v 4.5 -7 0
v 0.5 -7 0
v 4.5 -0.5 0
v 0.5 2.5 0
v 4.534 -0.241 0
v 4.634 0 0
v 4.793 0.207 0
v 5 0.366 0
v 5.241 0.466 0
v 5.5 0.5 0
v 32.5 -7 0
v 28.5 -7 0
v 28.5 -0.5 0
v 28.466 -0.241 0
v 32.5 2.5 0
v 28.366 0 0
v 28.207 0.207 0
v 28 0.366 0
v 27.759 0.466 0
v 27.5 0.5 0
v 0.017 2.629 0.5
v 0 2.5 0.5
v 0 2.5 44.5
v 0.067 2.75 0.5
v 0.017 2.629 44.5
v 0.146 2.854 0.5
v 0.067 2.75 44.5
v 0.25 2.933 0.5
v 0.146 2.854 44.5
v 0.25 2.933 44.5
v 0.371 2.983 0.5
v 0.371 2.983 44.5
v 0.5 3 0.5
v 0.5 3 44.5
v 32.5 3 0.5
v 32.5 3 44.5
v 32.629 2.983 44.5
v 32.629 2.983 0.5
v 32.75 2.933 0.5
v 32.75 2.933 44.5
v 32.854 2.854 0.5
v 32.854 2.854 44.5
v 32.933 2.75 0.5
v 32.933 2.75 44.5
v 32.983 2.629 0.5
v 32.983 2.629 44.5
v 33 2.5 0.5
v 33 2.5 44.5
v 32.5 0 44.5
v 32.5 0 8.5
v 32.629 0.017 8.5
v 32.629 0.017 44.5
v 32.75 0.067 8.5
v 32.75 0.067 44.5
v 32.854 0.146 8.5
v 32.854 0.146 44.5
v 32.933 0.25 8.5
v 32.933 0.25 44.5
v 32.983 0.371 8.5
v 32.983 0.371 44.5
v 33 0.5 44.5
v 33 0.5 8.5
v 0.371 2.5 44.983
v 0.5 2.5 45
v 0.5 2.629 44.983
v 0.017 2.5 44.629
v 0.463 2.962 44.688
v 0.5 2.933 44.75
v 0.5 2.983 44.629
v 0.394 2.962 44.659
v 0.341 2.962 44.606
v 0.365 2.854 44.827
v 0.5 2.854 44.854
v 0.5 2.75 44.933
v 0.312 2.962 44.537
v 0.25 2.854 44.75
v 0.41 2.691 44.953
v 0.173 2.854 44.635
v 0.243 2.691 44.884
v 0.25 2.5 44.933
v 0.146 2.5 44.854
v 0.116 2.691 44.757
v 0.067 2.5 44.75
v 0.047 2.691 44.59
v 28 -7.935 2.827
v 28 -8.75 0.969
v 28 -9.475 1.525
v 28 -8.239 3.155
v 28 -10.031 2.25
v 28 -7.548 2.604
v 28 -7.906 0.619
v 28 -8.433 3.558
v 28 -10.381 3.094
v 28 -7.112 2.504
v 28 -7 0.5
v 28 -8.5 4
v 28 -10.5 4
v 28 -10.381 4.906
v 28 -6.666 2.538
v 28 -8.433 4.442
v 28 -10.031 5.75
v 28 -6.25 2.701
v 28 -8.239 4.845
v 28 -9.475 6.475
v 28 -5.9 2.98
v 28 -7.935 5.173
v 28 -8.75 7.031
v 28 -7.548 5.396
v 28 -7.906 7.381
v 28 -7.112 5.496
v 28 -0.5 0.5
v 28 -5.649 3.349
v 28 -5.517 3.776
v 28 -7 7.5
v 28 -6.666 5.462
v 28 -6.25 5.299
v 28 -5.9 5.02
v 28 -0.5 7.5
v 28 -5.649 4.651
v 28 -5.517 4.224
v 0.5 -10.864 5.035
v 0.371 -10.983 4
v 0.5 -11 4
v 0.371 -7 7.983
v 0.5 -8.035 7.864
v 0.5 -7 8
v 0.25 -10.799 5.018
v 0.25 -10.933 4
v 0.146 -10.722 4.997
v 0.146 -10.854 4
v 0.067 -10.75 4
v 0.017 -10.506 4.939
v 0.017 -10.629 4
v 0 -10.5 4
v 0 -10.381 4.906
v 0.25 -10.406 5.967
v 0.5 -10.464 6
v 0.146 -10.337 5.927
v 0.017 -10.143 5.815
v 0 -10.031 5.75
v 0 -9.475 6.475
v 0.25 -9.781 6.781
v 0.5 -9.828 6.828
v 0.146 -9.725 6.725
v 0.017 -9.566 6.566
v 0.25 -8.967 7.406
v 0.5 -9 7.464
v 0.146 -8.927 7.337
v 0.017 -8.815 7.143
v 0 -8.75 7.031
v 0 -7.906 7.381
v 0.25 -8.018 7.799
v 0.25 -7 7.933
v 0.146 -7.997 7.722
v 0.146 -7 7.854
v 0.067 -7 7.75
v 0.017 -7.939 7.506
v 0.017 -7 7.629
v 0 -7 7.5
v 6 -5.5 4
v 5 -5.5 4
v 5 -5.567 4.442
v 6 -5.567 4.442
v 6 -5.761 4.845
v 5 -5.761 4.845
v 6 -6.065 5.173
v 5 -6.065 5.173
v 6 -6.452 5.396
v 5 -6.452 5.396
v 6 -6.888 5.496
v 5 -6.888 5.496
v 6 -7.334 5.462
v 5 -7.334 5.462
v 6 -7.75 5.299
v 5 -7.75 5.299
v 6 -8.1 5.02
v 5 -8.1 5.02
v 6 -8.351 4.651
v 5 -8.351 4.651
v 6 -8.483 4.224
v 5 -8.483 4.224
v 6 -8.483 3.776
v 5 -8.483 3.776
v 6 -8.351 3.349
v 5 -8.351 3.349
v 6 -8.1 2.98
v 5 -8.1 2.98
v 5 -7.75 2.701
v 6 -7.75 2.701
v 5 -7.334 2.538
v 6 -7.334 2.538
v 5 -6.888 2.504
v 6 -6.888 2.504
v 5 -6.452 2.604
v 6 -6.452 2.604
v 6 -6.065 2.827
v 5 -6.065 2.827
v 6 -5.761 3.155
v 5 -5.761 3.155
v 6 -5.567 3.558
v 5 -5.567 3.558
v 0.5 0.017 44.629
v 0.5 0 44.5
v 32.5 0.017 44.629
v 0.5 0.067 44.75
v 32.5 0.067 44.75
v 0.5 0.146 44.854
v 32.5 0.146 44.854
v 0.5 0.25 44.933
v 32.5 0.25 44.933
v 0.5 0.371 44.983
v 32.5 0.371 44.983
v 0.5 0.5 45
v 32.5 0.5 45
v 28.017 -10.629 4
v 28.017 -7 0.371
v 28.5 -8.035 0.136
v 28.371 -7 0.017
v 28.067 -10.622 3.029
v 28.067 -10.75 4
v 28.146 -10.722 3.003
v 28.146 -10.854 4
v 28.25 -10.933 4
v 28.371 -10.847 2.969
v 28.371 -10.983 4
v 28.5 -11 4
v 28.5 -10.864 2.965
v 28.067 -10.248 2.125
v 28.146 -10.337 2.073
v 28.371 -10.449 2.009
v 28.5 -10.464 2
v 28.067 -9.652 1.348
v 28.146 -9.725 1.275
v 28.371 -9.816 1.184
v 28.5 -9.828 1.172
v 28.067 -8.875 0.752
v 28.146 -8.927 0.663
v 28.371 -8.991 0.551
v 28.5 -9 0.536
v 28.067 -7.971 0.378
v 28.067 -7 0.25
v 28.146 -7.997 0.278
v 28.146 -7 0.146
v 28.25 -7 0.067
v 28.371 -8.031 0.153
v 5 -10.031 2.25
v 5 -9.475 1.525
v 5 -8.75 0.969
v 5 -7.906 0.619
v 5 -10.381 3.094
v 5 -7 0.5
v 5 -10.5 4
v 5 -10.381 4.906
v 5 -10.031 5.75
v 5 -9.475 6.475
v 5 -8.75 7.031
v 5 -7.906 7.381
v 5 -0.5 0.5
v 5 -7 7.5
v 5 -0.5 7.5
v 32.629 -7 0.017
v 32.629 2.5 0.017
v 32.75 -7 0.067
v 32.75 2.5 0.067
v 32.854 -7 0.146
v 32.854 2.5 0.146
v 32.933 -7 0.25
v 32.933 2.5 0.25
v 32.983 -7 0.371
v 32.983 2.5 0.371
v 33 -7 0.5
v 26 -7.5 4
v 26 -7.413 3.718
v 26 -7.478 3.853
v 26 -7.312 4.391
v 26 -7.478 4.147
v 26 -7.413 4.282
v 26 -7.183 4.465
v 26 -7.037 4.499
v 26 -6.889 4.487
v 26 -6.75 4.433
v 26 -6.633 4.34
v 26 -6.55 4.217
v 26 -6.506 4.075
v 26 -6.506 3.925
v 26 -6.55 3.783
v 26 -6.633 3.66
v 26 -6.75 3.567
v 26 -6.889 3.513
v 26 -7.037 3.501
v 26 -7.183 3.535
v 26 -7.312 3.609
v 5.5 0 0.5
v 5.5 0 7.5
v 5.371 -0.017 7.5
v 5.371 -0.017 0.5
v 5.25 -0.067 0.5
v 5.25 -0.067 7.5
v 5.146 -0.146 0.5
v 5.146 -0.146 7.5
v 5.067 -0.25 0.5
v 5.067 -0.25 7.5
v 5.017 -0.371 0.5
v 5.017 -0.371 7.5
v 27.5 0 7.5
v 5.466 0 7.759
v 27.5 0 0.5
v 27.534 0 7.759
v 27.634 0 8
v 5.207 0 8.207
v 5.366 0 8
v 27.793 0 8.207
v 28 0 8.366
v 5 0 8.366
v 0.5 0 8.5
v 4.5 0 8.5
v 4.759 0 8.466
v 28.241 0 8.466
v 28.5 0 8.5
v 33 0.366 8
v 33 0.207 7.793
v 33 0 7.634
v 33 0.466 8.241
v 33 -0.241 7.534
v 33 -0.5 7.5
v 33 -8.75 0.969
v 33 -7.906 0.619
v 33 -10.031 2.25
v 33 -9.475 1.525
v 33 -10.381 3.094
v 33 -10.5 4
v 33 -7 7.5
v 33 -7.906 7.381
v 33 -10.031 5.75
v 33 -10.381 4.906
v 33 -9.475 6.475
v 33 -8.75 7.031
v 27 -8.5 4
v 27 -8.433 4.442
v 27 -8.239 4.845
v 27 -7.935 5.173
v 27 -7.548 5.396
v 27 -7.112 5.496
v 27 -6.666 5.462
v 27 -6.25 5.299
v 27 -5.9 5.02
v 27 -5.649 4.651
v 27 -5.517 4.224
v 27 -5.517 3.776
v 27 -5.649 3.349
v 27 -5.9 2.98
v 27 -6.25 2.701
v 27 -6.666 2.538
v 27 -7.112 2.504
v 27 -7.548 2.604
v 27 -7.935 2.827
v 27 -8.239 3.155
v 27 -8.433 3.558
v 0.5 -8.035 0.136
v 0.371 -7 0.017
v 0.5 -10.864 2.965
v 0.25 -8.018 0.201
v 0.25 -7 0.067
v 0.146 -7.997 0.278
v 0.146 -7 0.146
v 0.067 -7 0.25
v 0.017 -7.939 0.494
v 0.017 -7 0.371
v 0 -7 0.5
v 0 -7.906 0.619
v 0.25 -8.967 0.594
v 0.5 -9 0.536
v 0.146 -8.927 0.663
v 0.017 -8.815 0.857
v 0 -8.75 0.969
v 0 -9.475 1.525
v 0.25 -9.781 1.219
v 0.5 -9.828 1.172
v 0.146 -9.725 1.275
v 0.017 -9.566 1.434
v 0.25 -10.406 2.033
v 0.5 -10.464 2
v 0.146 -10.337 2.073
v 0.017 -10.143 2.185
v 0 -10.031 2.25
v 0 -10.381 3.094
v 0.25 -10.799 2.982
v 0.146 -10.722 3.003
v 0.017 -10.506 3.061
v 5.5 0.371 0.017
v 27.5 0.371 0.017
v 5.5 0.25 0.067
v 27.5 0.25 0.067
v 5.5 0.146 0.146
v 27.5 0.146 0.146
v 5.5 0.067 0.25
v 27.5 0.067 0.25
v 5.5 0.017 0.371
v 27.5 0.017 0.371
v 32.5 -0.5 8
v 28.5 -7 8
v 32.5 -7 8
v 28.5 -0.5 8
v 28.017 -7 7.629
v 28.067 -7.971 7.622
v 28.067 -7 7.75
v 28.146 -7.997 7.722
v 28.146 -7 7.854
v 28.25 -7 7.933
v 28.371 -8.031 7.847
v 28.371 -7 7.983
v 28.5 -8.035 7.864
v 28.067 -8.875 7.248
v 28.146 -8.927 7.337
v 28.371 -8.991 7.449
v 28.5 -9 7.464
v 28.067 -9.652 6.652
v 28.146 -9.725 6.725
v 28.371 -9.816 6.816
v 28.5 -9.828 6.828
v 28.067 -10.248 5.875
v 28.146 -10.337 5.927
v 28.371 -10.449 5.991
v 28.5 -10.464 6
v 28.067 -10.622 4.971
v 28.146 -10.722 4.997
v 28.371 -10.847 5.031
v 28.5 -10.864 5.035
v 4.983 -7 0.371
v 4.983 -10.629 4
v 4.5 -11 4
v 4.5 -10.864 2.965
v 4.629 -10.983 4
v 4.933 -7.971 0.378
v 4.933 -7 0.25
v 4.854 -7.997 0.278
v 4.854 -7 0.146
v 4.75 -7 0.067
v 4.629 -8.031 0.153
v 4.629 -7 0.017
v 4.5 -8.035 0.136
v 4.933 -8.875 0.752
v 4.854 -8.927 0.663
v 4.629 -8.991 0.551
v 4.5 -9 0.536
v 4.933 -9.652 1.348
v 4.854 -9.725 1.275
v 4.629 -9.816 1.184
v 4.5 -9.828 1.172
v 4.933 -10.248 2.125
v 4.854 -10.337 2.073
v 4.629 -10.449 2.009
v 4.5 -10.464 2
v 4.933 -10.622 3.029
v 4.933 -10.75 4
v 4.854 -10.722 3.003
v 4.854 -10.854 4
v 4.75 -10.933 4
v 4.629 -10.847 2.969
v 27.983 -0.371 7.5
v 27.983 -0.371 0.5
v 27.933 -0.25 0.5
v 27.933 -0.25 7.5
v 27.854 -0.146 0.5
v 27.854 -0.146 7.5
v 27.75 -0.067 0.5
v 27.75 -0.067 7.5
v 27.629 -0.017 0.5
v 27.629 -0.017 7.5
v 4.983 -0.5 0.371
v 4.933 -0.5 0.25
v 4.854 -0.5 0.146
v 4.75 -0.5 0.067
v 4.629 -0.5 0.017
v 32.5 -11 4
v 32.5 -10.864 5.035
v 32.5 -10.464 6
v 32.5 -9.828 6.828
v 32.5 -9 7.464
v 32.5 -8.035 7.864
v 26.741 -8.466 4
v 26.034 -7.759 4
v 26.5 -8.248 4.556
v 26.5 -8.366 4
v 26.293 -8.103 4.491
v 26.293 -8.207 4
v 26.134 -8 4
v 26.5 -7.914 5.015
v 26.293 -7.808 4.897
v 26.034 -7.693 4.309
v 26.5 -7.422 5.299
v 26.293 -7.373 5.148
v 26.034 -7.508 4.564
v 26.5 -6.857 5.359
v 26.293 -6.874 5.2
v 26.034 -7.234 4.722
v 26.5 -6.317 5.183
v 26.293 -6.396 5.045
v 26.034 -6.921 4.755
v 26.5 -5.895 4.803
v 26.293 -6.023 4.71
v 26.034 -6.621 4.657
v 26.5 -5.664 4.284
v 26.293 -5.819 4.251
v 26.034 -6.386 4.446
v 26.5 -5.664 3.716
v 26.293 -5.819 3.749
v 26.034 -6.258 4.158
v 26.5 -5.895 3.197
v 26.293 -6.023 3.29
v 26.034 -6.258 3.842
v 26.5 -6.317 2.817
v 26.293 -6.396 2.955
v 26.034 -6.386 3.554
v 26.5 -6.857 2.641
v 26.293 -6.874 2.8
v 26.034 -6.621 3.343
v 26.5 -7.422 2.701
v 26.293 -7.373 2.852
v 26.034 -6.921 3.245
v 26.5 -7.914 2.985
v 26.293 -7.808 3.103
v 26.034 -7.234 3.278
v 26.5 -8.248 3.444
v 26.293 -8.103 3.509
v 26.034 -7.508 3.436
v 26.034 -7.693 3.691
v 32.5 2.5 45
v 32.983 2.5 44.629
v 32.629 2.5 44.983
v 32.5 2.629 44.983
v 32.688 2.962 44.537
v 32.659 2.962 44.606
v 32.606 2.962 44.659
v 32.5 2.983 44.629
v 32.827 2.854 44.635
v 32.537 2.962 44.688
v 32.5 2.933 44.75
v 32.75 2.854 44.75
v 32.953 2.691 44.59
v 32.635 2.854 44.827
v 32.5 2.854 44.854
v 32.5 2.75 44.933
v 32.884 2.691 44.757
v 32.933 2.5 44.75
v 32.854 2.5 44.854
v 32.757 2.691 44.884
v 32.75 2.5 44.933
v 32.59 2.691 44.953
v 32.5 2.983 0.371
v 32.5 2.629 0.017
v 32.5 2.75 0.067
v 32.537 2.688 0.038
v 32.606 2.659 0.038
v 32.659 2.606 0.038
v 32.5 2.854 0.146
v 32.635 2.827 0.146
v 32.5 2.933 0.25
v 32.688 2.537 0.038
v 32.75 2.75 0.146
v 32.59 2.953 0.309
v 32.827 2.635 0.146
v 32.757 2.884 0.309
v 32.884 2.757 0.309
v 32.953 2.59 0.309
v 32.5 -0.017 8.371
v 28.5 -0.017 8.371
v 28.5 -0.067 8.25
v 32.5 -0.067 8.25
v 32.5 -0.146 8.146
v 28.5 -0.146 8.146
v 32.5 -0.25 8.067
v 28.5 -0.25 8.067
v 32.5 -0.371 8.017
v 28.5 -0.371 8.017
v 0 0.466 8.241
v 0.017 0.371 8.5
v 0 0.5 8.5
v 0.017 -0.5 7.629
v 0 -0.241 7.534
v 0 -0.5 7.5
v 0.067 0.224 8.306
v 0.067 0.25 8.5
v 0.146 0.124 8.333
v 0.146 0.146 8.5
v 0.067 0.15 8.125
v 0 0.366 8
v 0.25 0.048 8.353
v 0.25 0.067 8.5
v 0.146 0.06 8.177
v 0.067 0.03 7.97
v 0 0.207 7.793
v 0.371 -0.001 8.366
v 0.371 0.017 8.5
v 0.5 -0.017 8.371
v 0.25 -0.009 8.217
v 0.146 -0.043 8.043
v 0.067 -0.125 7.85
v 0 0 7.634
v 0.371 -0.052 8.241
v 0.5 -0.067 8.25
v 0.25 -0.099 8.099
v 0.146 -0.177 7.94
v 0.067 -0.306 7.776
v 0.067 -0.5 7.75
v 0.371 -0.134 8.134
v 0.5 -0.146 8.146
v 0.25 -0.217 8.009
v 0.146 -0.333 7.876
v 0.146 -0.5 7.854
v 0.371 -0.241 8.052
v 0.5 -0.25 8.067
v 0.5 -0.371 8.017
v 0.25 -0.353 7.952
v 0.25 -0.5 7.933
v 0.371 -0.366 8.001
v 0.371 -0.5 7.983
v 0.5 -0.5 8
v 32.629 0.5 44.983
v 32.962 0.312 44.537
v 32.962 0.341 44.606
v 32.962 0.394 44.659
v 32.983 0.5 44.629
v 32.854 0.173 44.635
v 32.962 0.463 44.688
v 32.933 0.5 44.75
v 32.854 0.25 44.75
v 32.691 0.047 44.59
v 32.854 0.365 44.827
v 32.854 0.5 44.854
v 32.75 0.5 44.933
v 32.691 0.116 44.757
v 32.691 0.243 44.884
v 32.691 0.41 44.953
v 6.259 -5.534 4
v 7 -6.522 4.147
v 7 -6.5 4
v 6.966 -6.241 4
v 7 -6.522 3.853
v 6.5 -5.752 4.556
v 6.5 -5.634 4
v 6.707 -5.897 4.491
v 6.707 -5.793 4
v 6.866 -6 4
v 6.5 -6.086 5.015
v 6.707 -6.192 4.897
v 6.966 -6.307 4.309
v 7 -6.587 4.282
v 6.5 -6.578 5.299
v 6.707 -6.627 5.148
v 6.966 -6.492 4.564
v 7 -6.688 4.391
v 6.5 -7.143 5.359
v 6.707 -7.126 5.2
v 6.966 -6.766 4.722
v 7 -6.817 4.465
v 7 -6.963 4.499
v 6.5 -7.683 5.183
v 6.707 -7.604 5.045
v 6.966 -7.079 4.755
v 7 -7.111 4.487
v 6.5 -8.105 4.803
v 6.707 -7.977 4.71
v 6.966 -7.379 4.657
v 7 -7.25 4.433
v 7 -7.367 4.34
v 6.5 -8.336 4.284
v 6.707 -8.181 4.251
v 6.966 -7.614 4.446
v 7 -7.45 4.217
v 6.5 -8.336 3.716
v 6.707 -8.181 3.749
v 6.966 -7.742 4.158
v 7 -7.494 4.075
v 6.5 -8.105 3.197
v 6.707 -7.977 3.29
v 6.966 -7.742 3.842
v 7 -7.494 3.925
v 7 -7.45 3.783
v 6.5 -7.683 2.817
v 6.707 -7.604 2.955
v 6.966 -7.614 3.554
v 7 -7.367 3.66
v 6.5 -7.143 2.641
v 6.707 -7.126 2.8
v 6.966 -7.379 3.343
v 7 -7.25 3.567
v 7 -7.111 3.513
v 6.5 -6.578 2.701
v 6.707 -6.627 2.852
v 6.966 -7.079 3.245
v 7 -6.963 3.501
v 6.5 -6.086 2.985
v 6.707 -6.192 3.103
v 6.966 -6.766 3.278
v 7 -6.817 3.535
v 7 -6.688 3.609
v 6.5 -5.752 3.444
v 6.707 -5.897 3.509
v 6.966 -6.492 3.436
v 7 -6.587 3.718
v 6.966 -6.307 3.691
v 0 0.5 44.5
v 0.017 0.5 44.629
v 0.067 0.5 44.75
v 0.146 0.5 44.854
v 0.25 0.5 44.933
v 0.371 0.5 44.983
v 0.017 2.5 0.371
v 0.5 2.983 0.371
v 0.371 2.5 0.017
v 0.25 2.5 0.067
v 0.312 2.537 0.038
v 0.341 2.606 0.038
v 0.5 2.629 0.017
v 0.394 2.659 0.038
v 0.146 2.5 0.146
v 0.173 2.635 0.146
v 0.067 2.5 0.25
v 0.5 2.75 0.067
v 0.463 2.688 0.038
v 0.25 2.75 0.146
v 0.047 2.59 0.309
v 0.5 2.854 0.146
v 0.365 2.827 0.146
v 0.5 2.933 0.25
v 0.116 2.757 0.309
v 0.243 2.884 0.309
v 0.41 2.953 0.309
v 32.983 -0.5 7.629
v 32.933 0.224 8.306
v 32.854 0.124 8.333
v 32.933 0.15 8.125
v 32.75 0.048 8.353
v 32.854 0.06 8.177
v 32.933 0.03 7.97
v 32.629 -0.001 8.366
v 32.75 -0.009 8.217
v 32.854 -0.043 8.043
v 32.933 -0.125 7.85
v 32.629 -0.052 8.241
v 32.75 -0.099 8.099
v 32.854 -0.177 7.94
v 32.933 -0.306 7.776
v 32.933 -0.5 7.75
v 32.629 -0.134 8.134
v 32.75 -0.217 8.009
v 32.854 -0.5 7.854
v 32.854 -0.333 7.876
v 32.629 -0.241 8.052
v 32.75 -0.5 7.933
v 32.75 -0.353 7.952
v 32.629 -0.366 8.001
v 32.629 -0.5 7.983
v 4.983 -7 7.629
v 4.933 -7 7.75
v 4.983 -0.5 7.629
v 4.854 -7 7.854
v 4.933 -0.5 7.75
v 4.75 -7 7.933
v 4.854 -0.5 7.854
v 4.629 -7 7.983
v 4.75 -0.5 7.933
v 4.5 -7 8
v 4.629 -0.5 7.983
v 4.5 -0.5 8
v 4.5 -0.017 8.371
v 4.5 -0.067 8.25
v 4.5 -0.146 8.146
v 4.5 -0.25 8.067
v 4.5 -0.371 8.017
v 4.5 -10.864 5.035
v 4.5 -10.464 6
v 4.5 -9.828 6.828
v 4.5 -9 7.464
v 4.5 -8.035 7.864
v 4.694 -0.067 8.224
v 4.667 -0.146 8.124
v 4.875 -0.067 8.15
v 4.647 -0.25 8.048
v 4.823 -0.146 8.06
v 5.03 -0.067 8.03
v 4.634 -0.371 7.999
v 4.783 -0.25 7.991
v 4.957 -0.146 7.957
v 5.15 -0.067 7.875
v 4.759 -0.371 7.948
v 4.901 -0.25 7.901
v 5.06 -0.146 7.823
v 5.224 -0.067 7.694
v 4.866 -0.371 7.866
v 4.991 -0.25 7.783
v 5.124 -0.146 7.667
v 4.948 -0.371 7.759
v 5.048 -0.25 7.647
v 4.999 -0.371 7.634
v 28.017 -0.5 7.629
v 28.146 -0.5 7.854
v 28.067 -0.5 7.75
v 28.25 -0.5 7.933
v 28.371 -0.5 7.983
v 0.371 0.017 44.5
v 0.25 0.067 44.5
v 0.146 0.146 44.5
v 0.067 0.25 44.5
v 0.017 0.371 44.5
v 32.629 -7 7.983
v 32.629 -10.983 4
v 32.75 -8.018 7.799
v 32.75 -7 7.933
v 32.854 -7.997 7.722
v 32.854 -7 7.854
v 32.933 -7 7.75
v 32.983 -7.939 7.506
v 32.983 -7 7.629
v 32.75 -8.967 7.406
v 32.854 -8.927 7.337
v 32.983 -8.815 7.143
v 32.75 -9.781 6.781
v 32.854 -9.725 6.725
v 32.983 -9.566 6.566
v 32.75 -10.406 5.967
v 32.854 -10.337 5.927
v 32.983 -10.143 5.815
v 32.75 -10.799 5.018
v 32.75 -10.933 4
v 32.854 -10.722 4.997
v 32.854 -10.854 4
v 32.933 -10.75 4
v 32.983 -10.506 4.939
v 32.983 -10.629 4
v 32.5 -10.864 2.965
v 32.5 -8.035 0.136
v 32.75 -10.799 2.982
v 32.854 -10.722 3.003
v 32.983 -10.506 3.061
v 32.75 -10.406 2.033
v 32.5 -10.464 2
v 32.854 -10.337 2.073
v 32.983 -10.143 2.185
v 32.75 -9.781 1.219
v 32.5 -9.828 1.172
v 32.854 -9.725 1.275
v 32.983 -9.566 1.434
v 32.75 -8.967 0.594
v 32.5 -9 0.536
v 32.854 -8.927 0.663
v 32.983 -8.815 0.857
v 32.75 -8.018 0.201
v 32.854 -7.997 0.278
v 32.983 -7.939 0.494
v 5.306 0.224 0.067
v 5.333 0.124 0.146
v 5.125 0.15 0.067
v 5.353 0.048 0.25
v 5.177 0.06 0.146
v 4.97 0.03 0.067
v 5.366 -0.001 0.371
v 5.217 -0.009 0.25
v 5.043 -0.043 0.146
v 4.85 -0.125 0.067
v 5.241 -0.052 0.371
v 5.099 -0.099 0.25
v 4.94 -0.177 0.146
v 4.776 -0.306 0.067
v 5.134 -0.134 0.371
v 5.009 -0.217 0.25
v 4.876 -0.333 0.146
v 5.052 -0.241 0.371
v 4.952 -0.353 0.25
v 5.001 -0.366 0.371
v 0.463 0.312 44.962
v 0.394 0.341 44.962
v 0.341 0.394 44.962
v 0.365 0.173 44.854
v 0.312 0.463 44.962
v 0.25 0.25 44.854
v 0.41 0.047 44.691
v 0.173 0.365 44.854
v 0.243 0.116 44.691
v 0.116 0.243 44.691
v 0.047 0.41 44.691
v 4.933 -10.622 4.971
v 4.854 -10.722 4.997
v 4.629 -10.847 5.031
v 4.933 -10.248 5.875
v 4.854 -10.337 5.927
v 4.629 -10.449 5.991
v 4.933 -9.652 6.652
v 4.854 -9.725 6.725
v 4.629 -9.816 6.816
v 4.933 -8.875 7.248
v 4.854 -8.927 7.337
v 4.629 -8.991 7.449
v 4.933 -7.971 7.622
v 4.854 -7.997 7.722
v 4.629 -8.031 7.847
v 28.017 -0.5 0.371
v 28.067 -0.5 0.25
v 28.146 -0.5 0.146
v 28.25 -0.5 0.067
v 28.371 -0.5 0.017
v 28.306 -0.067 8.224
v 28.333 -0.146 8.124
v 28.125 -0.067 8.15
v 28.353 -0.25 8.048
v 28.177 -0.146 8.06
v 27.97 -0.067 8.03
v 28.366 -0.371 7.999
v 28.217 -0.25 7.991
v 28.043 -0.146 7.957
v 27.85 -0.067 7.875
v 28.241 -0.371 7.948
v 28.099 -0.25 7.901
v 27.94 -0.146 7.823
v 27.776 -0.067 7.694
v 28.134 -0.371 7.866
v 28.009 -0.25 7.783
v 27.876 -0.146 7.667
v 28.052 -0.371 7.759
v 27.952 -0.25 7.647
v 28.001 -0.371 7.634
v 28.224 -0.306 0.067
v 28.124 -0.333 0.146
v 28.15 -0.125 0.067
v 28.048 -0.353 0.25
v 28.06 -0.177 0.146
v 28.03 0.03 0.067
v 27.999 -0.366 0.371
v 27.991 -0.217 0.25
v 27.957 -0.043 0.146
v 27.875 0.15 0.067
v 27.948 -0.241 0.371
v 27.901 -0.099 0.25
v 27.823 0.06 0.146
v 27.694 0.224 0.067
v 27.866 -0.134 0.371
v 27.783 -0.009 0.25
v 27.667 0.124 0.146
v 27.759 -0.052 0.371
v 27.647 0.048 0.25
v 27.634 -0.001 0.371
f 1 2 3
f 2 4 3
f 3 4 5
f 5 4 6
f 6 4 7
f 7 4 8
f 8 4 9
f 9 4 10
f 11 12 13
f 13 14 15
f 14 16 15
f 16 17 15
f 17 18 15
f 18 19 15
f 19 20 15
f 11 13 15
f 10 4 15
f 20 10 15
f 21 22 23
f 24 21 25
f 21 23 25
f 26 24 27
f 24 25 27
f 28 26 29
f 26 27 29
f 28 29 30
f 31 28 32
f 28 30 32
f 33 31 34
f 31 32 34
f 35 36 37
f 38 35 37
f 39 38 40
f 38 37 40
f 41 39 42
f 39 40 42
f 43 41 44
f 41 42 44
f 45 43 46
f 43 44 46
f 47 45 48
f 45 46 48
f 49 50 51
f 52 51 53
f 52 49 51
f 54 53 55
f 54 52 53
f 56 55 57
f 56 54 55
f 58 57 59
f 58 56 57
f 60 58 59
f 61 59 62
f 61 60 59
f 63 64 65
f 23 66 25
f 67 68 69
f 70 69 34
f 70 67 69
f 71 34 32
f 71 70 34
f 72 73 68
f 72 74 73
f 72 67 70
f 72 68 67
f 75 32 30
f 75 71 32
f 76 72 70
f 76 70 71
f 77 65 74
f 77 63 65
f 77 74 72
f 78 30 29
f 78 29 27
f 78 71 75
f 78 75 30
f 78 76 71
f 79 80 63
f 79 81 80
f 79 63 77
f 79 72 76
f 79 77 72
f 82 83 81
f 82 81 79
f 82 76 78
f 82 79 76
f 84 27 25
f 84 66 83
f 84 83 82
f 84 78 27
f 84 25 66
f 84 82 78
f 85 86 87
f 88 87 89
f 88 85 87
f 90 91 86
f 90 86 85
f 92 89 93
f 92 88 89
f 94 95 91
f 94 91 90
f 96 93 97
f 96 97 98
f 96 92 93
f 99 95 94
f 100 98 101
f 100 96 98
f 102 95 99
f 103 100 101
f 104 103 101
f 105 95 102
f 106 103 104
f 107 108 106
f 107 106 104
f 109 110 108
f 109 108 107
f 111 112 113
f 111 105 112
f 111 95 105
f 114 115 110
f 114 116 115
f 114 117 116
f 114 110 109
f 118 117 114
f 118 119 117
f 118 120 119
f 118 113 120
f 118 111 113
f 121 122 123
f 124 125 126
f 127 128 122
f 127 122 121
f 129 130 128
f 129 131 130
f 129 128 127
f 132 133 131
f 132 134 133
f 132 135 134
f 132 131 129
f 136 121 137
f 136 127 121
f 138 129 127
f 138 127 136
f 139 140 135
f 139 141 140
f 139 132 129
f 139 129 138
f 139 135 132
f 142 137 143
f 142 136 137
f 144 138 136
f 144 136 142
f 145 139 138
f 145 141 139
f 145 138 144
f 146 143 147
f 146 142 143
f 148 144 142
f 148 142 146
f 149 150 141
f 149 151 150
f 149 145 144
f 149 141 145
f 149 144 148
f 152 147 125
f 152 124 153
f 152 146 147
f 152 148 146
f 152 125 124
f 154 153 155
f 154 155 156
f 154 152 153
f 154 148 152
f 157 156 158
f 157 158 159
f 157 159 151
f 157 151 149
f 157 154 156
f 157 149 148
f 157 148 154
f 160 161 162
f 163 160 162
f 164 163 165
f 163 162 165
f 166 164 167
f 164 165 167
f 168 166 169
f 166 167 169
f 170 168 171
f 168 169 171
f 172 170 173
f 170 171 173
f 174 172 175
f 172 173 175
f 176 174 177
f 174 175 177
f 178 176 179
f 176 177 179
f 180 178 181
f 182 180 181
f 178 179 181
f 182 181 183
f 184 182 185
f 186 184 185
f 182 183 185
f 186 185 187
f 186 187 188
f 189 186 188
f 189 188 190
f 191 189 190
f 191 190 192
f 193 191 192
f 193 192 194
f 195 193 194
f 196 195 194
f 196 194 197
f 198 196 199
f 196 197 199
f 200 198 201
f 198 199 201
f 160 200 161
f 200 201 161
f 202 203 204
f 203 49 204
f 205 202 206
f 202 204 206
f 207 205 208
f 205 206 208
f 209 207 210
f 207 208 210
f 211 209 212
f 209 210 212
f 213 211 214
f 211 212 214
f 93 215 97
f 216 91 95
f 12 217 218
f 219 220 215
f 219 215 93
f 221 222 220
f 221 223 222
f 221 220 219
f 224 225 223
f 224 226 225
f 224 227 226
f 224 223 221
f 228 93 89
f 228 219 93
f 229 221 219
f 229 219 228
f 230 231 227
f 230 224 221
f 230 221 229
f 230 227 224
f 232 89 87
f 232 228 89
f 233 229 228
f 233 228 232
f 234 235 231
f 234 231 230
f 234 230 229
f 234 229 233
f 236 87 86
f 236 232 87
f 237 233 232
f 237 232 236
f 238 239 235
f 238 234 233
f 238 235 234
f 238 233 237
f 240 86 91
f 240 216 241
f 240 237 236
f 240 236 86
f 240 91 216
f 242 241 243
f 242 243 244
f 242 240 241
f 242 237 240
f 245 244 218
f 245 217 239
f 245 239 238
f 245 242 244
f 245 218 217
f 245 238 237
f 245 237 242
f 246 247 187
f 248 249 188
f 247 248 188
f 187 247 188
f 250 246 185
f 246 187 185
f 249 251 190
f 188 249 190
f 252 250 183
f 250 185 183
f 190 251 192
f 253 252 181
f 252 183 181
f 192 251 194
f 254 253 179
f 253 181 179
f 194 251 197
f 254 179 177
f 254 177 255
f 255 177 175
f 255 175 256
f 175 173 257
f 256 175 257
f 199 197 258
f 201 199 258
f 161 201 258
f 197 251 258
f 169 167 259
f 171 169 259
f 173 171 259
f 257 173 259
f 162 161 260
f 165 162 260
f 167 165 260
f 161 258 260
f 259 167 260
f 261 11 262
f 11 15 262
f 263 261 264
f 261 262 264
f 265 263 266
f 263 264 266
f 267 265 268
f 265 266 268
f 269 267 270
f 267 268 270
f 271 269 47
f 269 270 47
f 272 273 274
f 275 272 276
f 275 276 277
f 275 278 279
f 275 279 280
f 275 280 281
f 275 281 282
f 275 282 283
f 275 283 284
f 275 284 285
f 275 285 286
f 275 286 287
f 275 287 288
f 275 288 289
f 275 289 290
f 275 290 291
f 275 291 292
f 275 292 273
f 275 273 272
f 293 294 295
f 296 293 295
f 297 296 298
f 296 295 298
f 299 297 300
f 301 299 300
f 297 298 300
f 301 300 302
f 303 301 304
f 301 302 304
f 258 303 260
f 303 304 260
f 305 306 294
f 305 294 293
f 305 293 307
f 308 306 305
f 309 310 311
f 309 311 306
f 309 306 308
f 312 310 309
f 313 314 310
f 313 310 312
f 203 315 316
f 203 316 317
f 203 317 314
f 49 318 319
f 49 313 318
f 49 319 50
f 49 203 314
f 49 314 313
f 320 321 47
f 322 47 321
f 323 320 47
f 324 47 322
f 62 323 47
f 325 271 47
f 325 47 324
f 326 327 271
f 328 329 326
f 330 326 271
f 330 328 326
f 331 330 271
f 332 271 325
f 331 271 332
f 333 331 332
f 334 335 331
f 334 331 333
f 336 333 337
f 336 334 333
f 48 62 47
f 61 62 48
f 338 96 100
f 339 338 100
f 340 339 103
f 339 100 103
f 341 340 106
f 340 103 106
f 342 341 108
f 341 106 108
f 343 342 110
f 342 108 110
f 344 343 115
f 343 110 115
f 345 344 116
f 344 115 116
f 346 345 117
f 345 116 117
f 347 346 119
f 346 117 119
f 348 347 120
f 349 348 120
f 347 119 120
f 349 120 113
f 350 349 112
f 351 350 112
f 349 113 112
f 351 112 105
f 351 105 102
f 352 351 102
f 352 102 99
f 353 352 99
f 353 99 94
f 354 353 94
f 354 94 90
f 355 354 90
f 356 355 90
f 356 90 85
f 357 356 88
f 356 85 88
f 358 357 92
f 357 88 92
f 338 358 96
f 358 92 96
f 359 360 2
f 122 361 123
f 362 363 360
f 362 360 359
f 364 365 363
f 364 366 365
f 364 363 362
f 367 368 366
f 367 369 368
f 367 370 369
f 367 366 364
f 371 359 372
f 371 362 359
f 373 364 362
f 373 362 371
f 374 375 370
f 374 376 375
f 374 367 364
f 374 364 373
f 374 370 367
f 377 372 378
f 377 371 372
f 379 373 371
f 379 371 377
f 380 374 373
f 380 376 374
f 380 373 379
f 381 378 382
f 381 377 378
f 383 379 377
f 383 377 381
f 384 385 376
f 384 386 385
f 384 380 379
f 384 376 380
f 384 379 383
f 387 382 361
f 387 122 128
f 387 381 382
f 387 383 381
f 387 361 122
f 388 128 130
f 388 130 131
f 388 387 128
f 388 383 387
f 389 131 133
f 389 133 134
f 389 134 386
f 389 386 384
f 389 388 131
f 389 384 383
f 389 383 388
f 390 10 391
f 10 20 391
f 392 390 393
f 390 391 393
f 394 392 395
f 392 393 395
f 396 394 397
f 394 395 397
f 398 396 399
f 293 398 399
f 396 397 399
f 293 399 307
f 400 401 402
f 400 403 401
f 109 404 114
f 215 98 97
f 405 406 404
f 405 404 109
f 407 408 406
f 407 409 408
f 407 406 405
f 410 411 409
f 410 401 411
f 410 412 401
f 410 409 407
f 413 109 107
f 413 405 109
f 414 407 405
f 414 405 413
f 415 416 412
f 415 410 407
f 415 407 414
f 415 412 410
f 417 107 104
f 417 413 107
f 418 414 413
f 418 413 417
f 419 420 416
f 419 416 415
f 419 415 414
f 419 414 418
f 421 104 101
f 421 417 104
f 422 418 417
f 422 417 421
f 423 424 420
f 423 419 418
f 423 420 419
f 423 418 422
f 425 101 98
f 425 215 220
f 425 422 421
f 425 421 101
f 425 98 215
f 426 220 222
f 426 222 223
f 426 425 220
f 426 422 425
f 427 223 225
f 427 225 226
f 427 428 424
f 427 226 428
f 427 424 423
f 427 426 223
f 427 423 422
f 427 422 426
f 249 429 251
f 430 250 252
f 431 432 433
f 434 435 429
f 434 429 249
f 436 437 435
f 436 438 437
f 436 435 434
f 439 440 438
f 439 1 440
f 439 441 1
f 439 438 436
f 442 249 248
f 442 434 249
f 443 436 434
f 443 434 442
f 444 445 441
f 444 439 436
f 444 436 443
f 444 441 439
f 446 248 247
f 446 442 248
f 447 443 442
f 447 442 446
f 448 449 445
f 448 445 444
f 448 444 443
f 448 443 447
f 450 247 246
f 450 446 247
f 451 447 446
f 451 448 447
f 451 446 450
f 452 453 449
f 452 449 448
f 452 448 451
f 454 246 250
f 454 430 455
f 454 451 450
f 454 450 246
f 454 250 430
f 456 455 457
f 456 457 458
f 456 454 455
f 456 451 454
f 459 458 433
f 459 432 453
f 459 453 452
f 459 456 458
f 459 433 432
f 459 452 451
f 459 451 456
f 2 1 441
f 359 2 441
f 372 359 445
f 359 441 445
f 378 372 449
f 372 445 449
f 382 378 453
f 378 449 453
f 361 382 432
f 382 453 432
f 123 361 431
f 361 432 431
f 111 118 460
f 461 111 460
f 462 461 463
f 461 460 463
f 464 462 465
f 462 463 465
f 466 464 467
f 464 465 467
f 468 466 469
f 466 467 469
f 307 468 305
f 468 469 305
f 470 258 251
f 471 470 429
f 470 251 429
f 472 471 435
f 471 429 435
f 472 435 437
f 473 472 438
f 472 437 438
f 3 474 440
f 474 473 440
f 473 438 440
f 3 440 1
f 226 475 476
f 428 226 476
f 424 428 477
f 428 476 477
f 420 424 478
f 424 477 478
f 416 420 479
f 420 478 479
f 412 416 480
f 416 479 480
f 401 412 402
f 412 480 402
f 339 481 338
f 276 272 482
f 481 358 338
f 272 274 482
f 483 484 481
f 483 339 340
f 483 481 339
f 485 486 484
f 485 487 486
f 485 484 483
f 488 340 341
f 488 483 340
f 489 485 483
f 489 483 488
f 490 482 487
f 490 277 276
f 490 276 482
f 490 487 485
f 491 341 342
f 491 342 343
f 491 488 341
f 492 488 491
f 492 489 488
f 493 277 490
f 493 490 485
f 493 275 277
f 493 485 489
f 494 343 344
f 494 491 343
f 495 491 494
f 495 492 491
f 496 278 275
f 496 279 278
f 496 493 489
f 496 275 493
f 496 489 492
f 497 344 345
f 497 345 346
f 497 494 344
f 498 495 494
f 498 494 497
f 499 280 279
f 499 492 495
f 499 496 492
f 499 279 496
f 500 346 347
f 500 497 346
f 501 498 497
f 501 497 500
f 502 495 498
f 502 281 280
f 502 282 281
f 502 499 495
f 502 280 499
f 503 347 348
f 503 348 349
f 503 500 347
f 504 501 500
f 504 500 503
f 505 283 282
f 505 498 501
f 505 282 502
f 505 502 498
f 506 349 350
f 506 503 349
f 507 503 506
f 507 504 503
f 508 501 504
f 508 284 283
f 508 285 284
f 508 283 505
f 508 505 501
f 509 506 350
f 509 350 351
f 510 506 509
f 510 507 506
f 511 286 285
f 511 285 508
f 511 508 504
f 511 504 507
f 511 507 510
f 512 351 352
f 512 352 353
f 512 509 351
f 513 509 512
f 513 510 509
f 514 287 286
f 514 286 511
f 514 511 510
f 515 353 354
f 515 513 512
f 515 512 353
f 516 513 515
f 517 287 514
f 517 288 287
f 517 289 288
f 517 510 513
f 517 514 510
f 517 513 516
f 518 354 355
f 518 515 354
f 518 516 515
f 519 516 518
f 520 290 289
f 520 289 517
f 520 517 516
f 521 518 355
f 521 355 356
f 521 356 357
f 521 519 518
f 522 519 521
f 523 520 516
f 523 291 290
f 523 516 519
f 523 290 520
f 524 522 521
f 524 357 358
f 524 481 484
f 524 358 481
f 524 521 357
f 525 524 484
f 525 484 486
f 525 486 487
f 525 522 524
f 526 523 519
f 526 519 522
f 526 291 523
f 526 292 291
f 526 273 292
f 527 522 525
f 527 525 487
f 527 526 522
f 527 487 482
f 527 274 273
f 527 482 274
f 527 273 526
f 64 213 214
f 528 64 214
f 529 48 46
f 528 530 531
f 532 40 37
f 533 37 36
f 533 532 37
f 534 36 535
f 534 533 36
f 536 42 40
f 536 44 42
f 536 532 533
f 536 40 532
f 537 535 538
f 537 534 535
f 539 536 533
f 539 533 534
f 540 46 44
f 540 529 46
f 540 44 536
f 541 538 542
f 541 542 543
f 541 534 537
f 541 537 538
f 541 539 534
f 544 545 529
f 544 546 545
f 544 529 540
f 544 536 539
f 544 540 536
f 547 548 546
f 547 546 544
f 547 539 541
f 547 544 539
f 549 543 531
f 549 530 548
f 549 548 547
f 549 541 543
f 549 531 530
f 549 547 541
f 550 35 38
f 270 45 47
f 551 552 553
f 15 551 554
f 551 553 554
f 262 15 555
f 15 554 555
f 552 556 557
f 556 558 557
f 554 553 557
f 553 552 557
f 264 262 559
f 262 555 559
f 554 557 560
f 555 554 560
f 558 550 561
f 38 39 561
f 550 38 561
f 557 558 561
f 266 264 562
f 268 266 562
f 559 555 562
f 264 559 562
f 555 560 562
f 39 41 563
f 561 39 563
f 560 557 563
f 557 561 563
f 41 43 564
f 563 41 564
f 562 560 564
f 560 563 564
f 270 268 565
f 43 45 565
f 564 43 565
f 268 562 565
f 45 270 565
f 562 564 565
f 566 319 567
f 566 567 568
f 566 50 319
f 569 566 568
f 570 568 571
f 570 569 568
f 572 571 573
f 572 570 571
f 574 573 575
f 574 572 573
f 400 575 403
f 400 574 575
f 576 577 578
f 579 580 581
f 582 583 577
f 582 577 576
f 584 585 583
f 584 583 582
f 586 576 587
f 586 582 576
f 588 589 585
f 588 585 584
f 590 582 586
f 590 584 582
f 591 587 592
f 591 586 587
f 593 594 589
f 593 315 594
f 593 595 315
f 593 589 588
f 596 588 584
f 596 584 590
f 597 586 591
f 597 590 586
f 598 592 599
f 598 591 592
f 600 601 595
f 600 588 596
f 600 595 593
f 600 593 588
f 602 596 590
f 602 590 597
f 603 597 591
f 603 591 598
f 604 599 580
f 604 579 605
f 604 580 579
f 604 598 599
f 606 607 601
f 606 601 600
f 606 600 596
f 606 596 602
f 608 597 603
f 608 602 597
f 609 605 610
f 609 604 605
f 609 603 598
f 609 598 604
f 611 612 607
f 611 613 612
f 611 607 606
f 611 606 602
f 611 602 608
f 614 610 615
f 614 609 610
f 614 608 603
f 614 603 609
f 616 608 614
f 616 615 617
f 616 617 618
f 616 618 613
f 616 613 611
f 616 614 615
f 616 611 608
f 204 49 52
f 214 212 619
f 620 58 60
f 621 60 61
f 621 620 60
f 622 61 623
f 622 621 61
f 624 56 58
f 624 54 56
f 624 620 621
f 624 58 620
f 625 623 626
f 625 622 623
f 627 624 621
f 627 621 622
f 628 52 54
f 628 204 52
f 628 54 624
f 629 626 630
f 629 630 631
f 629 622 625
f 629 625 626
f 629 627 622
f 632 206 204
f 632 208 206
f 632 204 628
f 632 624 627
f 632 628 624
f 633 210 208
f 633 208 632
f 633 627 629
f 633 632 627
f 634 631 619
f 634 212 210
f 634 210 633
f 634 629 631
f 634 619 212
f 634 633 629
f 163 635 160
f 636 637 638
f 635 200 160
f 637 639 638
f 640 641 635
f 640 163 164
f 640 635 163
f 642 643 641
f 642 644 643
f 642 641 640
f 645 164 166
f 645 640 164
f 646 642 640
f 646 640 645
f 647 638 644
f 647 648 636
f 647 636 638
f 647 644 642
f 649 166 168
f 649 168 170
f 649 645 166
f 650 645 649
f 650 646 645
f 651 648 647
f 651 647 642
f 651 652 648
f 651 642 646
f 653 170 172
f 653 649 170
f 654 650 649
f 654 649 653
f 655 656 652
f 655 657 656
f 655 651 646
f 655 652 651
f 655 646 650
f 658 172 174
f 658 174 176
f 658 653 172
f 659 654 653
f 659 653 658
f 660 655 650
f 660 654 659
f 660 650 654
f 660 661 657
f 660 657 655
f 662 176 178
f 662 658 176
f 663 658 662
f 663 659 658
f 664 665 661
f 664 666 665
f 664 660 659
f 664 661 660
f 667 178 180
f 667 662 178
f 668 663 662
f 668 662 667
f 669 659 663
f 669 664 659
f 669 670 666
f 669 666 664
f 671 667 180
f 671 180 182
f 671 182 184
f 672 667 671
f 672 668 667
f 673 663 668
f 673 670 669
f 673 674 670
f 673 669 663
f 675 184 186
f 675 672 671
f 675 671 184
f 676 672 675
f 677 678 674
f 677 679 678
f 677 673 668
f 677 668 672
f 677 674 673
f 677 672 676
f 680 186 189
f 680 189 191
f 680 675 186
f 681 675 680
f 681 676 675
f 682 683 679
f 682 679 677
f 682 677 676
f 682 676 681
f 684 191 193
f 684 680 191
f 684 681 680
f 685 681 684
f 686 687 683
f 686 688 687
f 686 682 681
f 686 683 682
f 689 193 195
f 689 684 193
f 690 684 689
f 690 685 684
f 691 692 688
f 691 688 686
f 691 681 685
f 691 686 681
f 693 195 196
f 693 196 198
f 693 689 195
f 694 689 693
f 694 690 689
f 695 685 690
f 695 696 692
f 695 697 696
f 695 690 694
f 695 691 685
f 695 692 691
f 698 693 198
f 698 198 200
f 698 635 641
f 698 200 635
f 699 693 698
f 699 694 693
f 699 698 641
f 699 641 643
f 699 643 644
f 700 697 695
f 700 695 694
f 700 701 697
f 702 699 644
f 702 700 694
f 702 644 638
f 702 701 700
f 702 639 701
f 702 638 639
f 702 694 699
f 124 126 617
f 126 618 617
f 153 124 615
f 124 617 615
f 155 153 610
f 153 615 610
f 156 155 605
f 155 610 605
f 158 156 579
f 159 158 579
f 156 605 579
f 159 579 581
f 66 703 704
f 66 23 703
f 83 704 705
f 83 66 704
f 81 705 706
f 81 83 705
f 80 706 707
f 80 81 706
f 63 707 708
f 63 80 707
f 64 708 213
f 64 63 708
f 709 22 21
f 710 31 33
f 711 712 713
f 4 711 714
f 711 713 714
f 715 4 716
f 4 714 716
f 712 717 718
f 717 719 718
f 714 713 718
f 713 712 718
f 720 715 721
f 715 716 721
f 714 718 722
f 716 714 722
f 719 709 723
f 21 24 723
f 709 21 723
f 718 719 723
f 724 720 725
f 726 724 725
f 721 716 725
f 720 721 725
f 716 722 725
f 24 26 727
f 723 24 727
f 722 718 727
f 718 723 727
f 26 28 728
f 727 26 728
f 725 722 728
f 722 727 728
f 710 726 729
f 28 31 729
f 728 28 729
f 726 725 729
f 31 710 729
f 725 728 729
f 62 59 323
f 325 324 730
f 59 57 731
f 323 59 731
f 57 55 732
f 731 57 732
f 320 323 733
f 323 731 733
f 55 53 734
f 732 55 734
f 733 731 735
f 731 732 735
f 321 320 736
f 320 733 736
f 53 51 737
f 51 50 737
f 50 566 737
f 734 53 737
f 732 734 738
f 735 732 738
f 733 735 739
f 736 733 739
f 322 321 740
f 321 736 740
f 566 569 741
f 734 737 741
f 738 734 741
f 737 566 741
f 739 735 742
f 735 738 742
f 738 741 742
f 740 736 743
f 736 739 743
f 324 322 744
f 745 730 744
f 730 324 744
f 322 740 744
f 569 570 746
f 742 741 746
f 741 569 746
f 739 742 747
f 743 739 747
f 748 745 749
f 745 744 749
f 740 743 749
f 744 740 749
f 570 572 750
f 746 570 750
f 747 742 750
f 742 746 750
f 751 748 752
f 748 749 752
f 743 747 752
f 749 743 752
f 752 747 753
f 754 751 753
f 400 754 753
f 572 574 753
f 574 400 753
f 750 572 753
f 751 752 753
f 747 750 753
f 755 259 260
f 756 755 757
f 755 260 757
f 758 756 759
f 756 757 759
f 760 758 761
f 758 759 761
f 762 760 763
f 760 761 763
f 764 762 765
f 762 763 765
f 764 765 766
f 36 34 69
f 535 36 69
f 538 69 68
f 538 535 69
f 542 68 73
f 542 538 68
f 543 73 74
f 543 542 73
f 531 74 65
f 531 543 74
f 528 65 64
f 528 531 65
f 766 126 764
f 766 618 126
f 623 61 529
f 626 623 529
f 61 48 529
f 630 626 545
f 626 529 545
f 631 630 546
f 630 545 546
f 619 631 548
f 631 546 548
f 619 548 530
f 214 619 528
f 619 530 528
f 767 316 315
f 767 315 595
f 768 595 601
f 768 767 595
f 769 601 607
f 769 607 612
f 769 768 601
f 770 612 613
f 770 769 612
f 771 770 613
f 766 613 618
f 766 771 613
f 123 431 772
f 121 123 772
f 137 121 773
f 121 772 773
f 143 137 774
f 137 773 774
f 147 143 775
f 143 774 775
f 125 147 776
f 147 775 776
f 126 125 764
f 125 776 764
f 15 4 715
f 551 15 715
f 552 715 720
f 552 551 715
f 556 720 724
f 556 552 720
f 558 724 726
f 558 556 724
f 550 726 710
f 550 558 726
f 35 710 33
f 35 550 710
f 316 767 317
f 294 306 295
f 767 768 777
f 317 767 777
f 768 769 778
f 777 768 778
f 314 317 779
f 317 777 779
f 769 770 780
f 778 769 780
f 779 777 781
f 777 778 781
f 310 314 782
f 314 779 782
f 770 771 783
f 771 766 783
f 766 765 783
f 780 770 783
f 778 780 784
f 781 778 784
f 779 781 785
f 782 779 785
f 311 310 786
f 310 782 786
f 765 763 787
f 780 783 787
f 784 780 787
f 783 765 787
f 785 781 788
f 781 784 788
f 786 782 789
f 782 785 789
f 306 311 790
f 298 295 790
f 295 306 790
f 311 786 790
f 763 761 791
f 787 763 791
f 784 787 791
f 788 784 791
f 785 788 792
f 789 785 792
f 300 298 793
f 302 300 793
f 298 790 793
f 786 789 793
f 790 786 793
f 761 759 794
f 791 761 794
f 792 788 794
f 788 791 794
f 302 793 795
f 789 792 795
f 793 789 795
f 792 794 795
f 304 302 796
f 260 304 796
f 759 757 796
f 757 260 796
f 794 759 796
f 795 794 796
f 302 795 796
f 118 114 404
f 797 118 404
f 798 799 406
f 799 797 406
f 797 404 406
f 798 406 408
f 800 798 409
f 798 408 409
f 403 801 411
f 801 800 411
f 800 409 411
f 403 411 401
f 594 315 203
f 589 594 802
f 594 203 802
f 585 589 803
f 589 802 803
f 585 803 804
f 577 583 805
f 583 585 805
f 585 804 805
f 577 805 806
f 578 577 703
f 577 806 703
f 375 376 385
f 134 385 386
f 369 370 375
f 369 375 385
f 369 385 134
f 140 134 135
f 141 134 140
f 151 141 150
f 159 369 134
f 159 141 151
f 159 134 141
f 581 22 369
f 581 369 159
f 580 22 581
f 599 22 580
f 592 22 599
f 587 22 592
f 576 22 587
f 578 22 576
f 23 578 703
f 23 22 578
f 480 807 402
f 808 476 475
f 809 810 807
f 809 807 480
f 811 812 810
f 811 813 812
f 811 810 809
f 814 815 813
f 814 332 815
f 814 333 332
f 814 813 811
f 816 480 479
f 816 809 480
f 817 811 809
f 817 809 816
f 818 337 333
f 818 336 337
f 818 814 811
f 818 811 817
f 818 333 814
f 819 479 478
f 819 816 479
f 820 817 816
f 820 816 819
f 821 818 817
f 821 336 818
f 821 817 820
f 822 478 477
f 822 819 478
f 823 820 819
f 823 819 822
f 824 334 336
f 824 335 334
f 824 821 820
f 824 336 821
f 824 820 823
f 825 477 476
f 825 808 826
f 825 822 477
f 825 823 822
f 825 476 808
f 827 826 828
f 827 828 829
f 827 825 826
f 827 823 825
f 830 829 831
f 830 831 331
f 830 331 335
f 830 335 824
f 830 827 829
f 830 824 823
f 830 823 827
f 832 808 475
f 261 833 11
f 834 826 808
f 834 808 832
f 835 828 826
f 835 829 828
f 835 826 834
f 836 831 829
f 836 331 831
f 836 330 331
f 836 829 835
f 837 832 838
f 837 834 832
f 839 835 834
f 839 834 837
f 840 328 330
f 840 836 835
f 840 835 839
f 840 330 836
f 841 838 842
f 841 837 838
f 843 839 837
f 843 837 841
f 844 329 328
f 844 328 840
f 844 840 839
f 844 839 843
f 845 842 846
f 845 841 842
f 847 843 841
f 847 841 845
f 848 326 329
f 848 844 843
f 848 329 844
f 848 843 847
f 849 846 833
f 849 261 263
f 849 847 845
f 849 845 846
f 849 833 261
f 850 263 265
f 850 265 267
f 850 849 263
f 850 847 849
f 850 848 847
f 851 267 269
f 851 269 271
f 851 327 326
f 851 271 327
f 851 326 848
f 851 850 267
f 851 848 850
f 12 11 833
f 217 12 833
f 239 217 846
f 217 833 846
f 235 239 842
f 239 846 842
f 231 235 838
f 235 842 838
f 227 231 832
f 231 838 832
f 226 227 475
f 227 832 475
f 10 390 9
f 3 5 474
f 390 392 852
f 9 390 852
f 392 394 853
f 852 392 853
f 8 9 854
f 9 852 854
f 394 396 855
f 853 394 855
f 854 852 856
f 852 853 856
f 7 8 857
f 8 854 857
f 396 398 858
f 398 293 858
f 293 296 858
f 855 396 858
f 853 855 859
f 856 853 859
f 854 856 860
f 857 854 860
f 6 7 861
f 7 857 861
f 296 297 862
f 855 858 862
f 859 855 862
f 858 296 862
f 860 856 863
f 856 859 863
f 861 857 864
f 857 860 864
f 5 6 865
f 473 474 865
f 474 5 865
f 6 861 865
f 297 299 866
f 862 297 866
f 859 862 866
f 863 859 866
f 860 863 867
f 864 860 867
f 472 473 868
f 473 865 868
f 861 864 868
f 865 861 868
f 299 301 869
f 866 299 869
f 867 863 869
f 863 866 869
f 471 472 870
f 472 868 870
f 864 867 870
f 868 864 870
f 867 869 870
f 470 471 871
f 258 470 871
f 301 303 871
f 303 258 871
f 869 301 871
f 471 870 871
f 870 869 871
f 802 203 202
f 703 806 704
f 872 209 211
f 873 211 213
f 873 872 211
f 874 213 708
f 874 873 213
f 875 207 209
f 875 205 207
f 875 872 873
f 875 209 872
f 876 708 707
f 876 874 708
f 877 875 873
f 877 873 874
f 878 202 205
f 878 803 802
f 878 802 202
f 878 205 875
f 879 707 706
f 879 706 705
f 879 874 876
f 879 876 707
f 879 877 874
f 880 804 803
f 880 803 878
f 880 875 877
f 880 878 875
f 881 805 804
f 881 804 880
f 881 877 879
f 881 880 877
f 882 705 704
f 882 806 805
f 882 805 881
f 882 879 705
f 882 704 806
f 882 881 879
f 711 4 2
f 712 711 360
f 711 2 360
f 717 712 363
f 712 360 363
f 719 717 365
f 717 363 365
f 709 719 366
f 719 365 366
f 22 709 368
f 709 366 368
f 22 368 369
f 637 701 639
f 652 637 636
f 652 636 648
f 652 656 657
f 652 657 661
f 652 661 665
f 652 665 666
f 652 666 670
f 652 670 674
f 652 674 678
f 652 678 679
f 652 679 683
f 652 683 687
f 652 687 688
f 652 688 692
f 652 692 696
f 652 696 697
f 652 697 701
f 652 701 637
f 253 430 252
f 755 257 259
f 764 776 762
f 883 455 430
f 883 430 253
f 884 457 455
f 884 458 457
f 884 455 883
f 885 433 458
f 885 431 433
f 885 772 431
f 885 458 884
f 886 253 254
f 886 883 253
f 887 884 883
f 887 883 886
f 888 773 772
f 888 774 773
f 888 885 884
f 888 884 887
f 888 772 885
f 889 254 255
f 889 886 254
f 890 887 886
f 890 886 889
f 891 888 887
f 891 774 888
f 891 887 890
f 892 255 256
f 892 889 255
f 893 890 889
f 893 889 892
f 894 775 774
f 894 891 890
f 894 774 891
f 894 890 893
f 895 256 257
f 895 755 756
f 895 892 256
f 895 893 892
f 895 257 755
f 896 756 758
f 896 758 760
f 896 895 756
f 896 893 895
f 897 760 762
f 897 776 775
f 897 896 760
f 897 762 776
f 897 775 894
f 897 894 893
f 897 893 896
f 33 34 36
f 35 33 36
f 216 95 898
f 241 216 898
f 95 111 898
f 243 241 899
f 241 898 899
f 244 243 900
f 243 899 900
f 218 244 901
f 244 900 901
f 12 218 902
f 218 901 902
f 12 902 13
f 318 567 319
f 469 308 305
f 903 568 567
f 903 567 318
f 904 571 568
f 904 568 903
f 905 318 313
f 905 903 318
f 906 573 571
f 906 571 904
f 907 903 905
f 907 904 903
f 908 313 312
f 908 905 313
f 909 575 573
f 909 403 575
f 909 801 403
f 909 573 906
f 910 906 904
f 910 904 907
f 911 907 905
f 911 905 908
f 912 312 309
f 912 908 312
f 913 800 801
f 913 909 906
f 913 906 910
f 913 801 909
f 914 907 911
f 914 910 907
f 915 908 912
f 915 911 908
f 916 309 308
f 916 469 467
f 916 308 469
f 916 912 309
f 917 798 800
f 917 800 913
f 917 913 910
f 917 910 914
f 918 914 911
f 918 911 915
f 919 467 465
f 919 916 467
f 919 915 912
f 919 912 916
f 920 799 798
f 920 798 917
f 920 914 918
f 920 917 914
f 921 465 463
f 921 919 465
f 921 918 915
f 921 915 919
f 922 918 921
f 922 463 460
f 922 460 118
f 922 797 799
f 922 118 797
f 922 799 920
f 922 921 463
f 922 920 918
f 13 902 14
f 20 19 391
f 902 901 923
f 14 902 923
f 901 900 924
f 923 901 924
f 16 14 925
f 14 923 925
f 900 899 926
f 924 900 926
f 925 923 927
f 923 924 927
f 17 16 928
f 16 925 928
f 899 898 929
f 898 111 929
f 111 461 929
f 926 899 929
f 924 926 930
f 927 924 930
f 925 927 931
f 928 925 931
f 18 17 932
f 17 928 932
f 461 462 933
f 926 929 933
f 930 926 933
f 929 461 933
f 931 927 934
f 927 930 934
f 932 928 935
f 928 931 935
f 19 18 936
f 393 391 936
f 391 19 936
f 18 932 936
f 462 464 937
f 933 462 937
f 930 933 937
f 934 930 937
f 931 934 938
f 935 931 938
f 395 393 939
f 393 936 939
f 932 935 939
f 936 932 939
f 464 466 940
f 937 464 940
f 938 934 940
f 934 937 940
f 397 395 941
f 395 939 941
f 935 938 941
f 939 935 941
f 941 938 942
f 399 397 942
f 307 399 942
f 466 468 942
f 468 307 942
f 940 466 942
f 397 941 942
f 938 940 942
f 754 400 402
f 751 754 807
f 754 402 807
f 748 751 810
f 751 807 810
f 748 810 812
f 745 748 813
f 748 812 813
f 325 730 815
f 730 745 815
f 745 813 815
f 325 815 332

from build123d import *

# Parameters (mm, degrees)
F0_W     = 33
F0_H     = 45
F1_DEPTH = 3
F2_W     = 5
F2_H     = 8
F3_DEPTH = 11
F4_R     = 1.5
F5_DEPTH = 2
F6_R     = 1
F7_R     = 1.5
F8_DEPTH = 2
F9_R     = 1
F10_R    = 3.99999
F11_R    = 0.5


# Not quite as in the source:
# - a fillet or chamfer is up to 0.001 mm smaller than in the source, because OpenCascade refuses the exact size


with BuildPart() as f1:
    # F0 (on Front) → F1 (new body)
    with BuildSketch(Plane.XZ):
        with Locations((16.5, 22.5)):
            Rectangle(F0_W, F0_H)
    extrude(amount=-F1_DEPTH)

    # F2 (on face) → F3 (join)
    with BuildSketch(Plane.XZ):
        with Locations((2.5, 4)):
            Rectangle(F2_W, F2_H)
        with Locations((30.5, 4)):
            Rectangle(F2_W, F2_H)
    extrude(amount=F3_DEPTH)

    # F4 (on face) → F5 (join)
    with BuildSketch(Plane.YZ.offset(5)):
        with Locations((-7, 4)):
            Circle(F4_R)
    extrude(amount=F5_DEPTH)

    # F6
    f6_edges = [f1.edges().sort_by_distance(p)[0] for p in [
        (7, -8.5, 4),
    ]]
    fillet(f6_edges, radius=F6_R)

    # F7 (on face) → F8 (join)
    with BuildSketch(Plane(origin=(28, 0, 0), x_dir=(0, -1, 0), z_dir=(-1, 0, 0))):
        with Locations((7, 4)):
            Circle(F7_R)
    extrude(amount=F8_DEPTH)

    # F9
    f9_edges = [f1.edges().sort_by_distance(p)[0] for p in [
        (26, -5.5, 4),
    ]]
    fillet(f9_edges, radius=F9_R)

    # F10 (radius 4 in the source; OpenCascade refuses exactly that, so slightly less here)
    f10_edges = [f1.edges().sort_by_distance(p)[0] for p in [
        (2.5, -11, 8),
        (2.5, -11, 0),
        (30.5, -11, 8),
        (30.5, -11, 0),
    ]]
    fillet(f10_edges, radius=F10_R)

    # F11
    f11_edges = [f1.edges().sort_by_distance(p)[0] for p in [
        (0, 0, 26.5),
        (16.5, 0, 45),
        (33, 0, 26.5),
        (33, 1.5, 45),
        (33, 3, 22.5),
        (0, 1.5, 45),
        (16.5, 3, 45),
        (0, 3, 22.5),
        (16.5, 0, 0),
        (28, 0, 4),
        (0, -2.000005, 0),
        (0, -9.82843, 1.17157),
        (0, -3.500005, 8),
        (5, -9.82843, 1.17157),
        (5, -3.500005, 0),
        (16.5, 3, 0),
        (5, -3.500005, 8),
        (2.5, 0, 8),
        (28, -3.500005, 8),
        (28, -9.82843, 6.82843),
        (28, -11, 4),
        (28, -3.500005, 0),
        (28, -9.82843, 1.17157),
        (33, -3.500005, 8),
        (30.5, 0, 8),
        (33, -9.82843, 6.82843),
        (5, 0, 4),
        (33, -11, 4),
        (33, -2.000005, 0),
        (33, -9.82843, 1.17157),
        (5, -11, 4),
        (5, -9.82843, 6.82843),
        (0, -11, 4),
        (0, -9.82843, 6.82843),
    ]]
    fillet(f11_edges, radius=F11_R)


solid = f1.part
